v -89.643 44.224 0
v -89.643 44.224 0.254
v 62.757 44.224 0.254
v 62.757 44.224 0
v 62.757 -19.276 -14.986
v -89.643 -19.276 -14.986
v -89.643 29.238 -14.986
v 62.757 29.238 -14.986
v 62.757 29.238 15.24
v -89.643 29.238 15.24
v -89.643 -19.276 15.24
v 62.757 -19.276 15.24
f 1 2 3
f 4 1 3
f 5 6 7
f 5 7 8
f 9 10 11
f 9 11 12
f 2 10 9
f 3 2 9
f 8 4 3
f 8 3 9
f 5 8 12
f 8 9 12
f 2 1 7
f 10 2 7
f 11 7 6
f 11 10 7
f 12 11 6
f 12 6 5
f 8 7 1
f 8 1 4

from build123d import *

# Parameters (mm, degrees)
F0_W      = 152.4
F0_H      = 63.5
F1_DEPTH  = 15.24
F2_SIZE   = 14.986
F1_FACE_W = 152.4
F1_FACE_H = 63.5
F3_DEPTH  = 14.986
F4_SIZE   = 14.986


with BuildPart() as f1:
    # F0 (on Top) → F1 (new body)
    with BuildSketch(Plane.XY):
        with Locations((-13.443335, 12.47429)):
            Rectangle(F0_W, F0_H)
    extrude(amount=F1_DEPTH)

    # F2
    f2_edges = [f1.edges().sort_by_distance(p)[0] for p in [
        (-13.443335, 44.22429, 15.24),
    ]]
    chamfer(f2_edges, length=F2_SIZE)

    # F1_face (on face) → F3 (join)
    with BuildSketch(Plane(origin=(-13.443335, 12.47429, 0), x_dir=(1, 0, 0), z_dir=(0, 0, -1))):
        Rectangle(F1_FACE_W, F1_FACE_H)
    extrude(amount=F3_DEPTH)

    # F4
    f4_edges = [f1.edges().sort_by_distance(p)[0] for p in [
        (-13.443335, 44.22429, -14.986),
    ]]
    chamfer(f4_edges, length=F4_SIZE)


solid = f1.part
